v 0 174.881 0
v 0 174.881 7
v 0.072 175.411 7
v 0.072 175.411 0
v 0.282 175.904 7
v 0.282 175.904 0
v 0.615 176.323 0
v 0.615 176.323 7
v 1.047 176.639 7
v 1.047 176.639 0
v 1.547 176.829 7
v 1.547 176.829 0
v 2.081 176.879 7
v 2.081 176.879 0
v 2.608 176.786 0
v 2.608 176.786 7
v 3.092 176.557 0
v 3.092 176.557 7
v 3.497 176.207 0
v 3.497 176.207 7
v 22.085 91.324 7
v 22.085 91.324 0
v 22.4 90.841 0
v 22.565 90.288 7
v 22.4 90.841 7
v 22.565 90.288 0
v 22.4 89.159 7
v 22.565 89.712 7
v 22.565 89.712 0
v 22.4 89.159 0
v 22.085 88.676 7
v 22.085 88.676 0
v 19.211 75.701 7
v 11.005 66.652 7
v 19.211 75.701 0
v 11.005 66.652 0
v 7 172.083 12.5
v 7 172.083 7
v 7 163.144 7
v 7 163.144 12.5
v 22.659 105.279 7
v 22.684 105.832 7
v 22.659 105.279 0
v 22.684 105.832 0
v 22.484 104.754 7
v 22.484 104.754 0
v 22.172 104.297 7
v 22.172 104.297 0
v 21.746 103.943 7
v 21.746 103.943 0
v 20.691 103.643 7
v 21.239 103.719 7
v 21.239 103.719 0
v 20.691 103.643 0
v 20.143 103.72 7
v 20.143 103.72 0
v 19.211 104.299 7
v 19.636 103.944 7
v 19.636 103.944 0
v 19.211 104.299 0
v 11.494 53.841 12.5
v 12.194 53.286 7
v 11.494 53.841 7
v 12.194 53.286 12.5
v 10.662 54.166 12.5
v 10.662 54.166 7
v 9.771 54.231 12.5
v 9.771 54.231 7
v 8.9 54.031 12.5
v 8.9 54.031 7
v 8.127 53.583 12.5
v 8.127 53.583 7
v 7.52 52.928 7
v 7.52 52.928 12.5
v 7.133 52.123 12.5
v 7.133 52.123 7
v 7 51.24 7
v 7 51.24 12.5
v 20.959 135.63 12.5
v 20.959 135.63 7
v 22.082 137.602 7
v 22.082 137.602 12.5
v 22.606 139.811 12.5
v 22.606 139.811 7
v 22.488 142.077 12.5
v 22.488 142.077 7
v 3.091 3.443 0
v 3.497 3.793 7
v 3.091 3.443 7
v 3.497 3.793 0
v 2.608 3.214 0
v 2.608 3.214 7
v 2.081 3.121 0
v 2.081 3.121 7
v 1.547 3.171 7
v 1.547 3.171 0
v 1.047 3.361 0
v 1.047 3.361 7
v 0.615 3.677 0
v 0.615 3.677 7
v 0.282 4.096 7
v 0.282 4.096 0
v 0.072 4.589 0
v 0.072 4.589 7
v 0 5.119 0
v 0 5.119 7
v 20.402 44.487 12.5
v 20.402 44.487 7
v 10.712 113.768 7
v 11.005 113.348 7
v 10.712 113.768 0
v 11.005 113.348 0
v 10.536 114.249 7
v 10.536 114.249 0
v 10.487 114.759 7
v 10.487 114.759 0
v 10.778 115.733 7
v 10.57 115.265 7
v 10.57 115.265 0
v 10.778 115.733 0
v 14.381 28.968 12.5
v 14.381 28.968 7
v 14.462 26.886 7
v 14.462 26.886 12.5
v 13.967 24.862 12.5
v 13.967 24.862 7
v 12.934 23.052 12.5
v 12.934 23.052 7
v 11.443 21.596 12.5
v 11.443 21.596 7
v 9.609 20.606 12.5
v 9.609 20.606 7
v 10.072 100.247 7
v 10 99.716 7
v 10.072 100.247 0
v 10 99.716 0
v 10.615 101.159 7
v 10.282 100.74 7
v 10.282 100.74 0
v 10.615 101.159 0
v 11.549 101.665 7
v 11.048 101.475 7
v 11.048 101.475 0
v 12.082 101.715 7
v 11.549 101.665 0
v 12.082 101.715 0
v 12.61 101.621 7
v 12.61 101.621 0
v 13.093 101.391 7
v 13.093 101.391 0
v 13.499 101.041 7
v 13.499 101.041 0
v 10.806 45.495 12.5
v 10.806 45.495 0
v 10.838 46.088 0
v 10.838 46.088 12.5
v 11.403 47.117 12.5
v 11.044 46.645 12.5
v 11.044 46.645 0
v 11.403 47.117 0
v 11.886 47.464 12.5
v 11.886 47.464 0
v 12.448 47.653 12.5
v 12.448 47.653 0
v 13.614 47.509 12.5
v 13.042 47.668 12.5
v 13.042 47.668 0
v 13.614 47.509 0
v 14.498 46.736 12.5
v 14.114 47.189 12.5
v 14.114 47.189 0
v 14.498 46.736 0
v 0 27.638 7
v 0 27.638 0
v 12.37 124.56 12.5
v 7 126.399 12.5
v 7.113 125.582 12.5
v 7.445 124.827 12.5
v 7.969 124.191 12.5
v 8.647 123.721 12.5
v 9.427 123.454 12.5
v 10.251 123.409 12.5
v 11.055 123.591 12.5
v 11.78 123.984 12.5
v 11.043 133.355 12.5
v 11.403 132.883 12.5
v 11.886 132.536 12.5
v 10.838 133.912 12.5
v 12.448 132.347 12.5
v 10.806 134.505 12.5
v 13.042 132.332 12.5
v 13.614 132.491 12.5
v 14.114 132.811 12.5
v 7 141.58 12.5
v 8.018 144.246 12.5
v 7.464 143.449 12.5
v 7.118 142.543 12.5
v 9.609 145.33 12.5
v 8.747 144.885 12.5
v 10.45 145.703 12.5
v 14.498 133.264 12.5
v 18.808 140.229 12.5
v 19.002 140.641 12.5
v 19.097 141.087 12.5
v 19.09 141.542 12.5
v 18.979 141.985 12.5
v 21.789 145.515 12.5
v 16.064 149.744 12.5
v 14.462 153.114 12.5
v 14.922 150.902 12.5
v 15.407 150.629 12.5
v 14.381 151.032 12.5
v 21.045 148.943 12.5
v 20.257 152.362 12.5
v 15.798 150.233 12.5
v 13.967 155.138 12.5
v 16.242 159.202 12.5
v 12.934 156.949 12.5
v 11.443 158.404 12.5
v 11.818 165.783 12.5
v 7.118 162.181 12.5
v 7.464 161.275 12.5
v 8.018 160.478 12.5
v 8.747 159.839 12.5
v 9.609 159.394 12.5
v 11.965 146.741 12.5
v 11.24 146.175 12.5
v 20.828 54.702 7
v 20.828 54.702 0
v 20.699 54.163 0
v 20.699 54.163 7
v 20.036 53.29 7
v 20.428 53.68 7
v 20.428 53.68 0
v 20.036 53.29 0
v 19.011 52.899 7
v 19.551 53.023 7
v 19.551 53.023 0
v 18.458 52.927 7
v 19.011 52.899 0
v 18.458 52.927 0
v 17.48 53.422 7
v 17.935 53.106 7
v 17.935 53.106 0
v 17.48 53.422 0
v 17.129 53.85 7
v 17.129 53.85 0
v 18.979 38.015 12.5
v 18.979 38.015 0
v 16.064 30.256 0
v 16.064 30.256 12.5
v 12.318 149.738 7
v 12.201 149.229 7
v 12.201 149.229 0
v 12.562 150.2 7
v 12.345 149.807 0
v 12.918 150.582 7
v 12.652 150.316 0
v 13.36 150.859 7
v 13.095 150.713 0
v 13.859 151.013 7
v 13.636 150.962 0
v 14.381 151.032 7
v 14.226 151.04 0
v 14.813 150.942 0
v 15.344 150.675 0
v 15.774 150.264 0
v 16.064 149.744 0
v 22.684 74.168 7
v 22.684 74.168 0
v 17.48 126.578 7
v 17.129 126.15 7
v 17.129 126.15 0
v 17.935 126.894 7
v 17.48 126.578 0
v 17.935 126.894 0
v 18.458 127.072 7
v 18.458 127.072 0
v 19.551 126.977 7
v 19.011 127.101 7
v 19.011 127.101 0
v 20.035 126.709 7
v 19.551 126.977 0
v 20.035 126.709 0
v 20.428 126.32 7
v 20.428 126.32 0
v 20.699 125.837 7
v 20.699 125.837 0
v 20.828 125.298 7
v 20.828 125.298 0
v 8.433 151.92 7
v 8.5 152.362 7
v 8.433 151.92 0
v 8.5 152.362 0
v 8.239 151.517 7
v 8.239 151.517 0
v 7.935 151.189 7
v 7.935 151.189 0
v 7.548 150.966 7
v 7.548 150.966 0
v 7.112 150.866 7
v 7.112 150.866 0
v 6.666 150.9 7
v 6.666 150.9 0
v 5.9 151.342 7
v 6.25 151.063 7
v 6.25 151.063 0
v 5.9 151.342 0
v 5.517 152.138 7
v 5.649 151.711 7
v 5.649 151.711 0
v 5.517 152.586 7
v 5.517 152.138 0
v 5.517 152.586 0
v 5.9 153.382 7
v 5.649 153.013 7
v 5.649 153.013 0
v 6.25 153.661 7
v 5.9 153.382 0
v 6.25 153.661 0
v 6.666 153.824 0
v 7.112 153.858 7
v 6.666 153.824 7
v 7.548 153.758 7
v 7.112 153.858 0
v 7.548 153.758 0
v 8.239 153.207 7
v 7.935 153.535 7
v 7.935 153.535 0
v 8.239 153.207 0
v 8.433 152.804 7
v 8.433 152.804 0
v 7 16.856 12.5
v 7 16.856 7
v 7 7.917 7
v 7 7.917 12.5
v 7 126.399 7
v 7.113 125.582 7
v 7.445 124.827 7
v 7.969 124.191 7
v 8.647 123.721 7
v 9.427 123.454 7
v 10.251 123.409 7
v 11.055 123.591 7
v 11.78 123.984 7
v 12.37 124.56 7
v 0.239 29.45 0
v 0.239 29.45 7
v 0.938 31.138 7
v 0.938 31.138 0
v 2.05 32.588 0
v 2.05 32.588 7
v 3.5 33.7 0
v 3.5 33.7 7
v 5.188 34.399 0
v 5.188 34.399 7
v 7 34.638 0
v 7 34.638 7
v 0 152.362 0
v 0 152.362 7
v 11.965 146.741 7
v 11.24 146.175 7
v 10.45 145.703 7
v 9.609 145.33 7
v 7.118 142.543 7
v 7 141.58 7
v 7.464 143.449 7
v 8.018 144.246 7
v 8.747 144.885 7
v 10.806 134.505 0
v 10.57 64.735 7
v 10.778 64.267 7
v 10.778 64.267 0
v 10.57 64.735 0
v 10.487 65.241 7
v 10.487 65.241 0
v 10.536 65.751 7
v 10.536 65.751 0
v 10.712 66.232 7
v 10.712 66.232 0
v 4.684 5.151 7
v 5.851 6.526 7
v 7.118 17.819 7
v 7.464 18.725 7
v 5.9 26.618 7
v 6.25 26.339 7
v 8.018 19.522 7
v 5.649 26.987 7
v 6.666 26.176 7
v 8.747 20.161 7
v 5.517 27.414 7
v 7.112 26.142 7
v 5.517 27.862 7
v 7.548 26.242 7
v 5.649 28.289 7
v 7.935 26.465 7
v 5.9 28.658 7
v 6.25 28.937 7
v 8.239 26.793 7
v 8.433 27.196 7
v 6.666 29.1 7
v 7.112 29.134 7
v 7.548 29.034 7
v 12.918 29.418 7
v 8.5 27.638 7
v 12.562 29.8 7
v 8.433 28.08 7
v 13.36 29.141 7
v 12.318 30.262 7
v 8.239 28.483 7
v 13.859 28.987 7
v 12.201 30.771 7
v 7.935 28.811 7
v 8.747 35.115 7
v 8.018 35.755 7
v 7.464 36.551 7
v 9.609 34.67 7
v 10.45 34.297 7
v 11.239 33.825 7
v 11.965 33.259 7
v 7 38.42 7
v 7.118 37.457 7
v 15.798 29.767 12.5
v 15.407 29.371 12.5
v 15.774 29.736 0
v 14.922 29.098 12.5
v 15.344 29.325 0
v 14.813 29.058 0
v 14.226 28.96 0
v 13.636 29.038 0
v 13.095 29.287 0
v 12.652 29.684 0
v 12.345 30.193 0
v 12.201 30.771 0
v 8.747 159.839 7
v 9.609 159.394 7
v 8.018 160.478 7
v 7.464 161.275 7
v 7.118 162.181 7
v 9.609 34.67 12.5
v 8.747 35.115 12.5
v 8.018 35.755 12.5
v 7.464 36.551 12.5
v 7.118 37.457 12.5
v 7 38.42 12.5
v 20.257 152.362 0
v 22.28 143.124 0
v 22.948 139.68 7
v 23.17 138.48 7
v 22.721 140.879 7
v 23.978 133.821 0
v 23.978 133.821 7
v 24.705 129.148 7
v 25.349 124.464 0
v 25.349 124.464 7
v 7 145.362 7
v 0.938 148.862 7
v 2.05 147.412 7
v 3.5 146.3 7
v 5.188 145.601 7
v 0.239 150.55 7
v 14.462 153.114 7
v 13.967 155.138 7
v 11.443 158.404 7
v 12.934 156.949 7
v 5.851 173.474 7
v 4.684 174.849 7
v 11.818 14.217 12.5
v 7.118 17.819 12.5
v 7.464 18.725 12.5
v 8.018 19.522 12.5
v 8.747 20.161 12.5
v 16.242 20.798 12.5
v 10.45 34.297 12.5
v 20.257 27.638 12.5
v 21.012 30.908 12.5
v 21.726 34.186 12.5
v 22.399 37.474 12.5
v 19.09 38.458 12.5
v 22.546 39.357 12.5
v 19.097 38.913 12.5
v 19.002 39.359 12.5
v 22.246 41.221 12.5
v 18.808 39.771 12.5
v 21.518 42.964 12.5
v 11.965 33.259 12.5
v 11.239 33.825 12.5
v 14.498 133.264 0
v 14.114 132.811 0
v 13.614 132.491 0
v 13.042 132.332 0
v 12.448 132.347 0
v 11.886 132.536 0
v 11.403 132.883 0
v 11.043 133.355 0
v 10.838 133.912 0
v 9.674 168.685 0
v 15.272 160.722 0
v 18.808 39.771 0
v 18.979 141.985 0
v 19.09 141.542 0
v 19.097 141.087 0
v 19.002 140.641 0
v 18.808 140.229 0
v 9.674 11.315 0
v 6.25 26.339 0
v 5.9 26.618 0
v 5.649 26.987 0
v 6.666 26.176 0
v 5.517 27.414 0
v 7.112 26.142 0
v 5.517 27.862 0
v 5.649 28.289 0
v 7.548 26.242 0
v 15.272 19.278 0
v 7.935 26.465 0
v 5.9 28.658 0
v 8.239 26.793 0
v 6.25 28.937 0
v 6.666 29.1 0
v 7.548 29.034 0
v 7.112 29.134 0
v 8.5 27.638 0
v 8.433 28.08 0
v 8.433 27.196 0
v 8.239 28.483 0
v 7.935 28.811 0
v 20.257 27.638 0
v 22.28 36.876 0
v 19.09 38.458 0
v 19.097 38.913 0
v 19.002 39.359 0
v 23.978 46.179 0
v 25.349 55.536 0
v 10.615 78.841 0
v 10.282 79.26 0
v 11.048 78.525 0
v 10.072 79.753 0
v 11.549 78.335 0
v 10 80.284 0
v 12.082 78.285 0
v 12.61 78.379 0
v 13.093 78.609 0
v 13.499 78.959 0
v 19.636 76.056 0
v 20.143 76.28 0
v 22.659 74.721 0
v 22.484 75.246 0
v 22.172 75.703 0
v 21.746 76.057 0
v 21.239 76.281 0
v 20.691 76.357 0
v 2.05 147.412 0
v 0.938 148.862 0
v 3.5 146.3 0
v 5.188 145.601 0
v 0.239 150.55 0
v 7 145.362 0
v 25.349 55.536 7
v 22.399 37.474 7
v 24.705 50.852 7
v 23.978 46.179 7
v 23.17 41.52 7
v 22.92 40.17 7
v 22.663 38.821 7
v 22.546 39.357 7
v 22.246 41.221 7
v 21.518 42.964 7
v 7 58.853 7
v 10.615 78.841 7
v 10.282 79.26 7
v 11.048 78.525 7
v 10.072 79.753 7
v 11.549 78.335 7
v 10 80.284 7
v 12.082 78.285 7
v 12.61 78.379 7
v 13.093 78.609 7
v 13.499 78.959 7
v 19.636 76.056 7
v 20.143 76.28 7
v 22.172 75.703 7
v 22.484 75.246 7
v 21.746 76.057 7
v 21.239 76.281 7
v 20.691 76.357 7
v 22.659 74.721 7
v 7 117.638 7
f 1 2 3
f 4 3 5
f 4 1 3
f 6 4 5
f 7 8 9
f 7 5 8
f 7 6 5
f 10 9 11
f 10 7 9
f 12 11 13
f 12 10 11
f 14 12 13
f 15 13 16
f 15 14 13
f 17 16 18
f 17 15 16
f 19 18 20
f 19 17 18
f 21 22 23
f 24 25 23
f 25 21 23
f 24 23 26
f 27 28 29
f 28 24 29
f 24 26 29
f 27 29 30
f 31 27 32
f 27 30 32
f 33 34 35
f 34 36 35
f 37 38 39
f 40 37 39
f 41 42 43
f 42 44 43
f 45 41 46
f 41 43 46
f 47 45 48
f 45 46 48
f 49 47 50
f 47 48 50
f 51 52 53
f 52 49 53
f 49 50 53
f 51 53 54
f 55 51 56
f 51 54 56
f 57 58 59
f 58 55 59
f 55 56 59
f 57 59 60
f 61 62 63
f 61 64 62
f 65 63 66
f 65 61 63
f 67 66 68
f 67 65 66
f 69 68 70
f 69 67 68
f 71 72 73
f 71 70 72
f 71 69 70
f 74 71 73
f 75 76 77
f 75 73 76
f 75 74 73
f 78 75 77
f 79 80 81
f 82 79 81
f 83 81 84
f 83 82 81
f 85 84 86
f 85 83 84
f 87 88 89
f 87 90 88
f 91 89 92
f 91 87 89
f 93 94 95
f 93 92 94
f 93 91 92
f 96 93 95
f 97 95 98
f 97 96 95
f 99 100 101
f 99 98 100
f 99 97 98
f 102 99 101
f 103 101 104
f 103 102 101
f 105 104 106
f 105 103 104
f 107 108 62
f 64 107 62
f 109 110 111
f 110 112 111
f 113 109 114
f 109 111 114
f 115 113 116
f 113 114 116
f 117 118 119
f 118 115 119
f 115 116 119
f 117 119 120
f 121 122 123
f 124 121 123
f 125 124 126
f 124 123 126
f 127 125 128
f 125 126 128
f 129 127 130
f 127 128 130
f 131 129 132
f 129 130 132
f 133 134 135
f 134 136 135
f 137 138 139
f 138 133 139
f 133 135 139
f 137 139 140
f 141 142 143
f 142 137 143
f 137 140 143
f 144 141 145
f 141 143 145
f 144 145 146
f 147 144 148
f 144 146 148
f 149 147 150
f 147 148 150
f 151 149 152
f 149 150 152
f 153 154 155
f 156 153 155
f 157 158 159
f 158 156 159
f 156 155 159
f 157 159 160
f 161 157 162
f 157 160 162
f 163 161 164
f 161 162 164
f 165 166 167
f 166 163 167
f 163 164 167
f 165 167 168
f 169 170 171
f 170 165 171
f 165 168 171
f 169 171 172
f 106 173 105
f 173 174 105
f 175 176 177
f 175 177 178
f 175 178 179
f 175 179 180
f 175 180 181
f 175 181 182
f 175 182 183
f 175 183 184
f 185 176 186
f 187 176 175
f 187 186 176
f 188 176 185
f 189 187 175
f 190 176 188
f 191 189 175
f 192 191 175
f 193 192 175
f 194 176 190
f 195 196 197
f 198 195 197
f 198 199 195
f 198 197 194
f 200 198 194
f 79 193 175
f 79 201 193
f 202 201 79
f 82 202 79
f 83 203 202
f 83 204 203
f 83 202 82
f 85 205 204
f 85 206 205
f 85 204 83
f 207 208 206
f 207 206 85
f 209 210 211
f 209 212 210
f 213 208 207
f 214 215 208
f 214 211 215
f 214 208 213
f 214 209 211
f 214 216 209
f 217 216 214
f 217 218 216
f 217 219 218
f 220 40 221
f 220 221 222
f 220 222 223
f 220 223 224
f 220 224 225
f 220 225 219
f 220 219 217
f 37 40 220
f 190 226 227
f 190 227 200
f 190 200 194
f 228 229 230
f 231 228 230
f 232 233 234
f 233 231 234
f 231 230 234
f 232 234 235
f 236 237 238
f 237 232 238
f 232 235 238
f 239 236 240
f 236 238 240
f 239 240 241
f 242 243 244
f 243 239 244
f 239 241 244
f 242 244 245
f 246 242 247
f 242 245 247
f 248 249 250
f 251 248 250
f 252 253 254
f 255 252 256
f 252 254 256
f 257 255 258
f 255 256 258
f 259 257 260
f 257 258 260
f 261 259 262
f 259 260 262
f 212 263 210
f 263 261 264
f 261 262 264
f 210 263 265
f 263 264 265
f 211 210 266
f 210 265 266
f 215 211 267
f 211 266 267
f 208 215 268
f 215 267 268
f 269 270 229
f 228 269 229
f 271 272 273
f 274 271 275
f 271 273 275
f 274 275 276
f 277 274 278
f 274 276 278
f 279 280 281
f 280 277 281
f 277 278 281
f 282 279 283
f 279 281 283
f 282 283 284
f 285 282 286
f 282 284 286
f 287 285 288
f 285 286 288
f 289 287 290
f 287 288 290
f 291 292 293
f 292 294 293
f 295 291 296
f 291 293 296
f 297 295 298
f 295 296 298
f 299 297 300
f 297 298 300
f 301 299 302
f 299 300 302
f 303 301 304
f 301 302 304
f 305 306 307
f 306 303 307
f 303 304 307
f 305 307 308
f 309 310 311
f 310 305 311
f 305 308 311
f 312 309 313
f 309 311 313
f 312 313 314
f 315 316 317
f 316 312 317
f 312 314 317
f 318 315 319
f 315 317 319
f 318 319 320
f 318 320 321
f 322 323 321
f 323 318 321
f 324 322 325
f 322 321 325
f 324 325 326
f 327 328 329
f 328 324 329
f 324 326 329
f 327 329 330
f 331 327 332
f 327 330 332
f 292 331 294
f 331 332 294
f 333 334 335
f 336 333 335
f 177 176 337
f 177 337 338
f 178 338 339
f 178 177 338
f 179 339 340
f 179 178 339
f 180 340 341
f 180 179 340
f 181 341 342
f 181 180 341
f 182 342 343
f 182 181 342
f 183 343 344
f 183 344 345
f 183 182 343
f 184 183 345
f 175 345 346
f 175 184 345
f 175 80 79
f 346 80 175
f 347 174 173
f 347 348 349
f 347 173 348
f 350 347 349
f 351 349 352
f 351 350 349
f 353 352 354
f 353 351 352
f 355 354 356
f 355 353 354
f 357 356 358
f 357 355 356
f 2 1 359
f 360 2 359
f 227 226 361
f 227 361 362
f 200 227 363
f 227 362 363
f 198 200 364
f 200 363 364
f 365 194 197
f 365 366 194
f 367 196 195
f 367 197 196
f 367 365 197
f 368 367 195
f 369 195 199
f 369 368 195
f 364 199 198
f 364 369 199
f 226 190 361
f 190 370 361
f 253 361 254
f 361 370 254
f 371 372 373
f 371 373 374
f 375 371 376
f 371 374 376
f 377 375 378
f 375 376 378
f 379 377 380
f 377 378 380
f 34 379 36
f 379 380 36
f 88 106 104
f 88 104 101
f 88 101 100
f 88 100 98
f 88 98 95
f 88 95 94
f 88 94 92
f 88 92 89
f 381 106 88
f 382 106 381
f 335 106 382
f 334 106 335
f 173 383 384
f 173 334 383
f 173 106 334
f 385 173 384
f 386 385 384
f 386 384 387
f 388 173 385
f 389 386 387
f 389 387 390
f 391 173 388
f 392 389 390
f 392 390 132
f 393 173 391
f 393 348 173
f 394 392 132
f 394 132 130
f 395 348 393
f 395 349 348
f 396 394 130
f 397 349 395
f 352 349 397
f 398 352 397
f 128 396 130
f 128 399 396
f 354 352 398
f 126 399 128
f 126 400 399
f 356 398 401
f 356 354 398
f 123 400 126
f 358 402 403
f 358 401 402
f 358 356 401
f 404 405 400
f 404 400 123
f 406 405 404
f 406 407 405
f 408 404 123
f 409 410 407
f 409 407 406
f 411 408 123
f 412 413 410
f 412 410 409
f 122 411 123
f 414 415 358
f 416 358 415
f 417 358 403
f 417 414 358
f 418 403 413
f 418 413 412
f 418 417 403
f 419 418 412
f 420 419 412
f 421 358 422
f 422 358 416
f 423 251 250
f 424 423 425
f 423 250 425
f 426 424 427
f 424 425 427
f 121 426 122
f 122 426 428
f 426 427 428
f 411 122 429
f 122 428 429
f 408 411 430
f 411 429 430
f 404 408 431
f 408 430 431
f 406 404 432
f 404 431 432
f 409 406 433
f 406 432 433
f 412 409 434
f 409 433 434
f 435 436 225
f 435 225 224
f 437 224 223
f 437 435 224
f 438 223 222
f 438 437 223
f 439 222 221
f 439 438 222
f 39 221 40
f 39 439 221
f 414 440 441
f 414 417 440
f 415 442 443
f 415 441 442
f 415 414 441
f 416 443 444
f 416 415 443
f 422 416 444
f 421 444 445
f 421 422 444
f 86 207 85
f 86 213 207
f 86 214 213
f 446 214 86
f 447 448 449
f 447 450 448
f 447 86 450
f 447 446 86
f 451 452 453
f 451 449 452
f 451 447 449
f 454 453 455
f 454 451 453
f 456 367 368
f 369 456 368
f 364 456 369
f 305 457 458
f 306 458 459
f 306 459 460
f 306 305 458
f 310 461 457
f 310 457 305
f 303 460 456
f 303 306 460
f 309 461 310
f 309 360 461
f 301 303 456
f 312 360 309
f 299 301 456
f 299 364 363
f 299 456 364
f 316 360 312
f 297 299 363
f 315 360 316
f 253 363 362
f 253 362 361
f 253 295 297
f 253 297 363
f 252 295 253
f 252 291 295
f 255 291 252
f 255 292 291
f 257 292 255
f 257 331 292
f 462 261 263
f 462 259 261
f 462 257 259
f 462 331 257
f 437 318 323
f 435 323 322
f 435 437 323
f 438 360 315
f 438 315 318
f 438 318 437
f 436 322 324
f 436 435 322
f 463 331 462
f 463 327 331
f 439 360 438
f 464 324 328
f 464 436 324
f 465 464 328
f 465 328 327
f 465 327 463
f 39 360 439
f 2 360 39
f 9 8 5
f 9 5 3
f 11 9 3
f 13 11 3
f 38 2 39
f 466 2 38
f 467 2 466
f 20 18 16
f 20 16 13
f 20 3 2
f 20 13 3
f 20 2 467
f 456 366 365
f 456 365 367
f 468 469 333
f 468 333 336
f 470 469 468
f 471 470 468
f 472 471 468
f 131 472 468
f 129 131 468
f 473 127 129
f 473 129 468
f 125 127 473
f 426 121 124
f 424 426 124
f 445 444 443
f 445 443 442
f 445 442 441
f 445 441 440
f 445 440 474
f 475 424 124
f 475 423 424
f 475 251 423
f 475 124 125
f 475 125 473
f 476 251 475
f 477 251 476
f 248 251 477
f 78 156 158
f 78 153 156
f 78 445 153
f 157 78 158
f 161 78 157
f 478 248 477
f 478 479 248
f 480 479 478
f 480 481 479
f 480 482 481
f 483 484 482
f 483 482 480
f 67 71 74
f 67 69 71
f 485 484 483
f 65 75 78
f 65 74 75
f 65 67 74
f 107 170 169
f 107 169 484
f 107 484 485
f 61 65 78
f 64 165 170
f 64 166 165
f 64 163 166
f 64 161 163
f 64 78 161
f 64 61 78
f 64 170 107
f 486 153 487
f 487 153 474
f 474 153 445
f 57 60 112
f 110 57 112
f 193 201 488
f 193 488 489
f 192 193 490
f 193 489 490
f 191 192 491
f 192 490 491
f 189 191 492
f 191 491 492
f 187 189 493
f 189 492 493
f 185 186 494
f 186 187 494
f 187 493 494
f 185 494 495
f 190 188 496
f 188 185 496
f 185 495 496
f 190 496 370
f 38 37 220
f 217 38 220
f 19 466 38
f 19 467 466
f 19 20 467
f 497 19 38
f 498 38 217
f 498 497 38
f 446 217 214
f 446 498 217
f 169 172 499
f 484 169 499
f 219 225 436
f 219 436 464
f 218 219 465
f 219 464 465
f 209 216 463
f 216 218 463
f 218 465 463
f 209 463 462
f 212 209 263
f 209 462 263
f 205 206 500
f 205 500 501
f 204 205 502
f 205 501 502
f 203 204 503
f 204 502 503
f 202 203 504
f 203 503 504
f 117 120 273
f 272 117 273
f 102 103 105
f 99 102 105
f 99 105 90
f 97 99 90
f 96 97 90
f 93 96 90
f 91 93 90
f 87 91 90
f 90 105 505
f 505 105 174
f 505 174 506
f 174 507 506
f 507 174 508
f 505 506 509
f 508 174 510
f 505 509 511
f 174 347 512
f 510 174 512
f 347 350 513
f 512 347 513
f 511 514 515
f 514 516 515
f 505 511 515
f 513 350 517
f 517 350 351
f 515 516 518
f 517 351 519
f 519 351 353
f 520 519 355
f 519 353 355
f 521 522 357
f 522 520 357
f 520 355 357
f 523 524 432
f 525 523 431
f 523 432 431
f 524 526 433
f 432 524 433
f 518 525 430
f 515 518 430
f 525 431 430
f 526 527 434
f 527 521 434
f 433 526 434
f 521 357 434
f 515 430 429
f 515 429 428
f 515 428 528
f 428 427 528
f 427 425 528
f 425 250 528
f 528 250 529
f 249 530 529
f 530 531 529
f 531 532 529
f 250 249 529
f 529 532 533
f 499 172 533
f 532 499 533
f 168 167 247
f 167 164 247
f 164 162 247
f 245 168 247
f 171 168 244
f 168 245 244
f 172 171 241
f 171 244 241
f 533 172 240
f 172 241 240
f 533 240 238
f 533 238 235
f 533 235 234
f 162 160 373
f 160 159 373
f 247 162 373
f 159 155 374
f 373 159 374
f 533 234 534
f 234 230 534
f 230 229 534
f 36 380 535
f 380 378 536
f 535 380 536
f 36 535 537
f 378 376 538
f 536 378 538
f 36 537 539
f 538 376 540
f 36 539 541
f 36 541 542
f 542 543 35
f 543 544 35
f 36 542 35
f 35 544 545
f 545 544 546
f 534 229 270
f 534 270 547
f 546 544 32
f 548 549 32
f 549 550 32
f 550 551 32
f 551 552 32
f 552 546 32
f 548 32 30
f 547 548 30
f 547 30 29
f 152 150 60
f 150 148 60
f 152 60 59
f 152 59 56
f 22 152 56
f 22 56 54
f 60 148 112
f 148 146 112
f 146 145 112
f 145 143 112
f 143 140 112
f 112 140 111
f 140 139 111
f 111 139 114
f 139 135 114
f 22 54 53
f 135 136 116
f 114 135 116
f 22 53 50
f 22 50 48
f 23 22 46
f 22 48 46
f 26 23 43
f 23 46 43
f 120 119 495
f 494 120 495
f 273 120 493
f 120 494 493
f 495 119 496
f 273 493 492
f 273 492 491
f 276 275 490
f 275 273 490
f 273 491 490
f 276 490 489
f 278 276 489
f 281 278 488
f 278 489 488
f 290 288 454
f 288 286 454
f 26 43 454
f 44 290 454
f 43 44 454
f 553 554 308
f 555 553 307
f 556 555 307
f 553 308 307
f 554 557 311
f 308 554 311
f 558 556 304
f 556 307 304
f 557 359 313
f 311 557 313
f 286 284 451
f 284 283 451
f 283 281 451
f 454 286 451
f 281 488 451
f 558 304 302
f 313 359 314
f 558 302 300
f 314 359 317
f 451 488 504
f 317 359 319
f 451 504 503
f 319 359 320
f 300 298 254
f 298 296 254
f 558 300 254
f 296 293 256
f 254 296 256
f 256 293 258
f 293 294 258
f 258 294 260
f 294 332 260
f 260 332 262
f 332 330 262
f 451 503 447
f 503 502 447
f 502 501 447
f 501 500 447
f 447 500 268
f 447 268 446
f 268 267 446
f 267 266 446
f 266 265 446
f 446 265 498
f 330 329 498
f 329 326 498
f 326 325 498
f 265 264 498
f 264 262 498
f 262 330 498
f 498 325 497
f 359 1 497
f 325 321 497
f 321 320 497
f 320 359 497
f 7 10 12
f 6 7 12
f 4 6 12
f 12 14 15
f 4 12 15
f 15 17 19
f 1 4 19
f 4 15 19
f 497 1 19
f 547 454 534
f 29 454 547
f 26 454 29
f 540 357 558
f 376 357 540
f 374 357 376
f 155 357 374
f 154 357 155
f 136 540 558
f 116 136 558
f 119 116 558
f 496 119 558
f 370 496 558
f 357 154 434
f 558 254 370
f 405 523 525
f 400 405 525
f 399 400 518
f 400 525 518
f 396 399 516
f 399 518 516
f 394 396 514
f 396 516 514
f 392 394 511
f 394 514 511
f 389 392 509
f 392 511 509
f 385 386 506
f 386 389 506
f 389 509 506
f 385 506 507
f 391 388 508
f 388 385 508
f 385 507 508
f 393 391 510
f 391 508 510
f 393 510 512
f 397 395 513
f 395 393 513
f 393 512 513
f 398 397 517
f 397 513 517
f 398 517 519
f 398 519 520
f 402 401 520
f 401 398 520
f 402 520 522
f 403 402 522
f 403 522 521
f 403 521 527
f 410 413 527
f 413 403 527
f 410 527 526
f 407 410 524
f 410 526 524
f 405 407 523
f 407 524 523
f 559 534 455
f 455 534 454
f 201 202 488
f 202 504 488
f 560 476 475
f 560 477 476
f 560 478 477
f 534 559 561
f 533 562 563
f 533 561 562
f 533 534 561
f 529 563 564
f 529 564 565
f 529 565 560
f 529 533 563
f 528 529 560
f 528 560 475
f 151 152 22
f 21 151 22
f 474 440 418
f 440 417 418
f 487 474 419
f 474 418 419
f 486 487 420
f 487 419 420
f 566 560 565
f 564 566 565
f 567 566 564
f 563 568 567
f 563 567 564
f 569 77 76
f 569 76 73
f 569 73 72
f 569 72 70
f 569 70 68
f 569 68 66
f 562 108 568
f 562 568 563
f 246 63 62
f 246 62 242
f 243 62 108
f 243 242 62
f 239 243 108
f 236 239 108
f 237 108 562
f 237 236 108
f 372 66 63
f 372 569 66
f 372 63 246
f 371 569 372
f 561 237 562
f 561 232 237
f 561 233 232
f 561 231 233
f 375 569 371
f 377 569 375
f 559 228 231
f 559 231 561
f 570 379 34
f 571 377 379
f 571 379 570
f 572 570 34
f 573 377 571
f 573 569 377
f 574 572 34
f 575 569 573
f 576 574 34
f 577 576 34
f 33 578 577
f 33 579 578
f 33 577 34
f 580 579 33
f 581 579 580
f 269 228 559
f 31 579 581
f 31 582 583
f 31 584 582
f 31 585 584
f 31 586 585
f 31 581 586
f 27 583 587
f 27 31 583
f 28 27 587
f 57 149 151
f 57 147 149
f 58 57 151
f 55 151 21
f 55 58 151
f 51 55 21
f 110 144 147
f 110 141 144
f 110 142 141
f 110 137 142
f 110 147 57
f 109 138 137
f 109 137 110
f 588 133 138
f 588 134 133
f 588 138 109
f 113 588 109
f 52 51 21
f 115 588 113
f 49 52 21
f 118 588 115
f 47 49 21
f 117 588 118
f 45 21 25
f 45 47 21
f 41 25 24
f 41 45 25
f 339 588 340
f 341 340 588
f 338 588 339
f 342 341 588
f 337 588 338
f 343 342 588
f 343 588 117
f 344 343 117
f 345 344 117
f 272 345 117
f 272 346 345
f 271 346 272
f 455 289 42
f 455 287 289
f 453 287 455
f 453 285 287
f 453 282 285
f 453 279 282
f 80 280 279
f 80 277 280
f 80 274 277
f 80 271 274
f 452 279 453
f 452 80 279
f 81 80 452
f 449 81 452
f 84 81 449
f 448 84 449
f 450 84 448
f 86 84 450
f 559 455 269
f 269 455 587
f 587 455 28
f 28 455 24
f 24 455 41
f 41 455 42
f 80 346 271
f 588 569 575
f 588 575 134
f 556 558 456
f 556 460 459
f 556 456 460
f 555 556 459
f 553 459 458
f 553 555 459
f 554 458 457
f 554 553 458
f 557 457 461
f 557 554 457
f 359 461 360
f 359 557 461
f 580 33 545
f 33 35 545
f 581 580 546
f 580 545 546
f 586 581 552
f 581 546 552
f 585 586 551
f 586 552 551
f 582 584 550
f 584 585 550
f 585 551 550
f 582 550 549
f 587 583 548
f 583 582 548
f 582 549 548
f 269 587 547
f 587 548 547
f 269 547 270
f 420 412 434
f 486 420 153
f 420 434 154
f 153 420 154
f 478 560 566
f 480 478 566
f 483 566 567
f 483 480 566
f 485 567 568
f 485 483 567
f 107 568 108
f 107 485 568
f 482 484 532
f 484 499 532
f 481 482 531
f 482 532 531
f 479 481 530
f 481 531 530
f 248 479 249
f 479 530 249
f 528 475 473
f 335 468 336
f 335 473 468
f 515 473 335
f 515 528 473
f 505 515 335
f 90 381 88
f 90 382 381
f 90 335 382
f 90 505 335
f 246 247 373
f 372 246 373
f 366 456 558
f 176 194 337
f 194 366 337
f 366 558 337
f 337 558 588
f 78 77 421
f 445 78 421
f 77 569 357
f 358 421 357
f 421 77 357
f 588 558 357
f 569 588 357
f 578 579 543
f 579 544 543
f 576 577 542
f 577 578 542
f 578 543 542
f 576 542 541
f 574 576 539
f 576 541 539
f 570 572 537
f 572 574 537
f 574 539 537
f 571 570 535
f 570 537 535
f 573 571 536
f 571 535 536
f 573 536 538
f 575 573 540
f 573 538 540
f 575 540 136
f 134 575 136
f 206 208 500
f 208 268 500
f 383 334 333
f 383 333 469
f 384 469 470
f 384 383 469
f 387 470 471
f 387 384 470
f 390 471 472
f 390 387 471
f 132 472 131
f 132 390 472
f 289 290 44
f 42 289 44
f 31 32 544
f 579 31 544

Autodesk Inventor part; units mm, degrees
ref_plane "YZ Plane" through (0, 0, 0) normal (1, 0, 0) x (0, 1, 0)
ref_plane "XZ Plane" through (0, 0, 0) normal (0, 1, 0) x (-1, 0, 0)
ref_plane "XY Plane" through (0, 0, 0) normal (0, 0, 1) x (1, 0, 0)
sketch "スケッチ1" plane through (0, 0, 0) normal (0, 0, 1) x (1, 0, 0)
  arc A0 (0, 5.1191) -> (3.497, 3.7928) centre (2, 5.1191) ccw
  arc A1 (3.497, 3.7928) -> (20.2574, 27.638) centre (-93.8083, 90) ccw
  arc A2 (20.2574, 27.638) -> (25.3494, 55.5364) centre (-242.442, 90) ccw
  line L0 (25.3494, 55.5364) -> (25.3494, 124.4636)
  arc A3 (25.3494, 124.4636) -> (20.2574, 152.362) centre (-242.442, 90) ccw
  arc A4 (20.2574, 152.362) -> (3.497, 176.2072) centre (-93.8083, 90) ccw
  arc A5 (3.497, 176.2072) -> (0, 174.8809) centre (2, 174.8809) ccw
  line L1 (0, 174.8809) -> (0, 152.362)
  arc A6 (0, 152.362) -> (7, 145.362) centre (7, 152.362) ccw
  line L2 (7, 145.362) -> (7, 109.815)
  line L3 (7, 80.815) -> (7, 34.638)
  arc A7 (7, 34.638) -> (0, 27.638) centre (7, 27.638) ccw
  line L4 (0, 27.638) -> (0, 5.1191)
  arc A8 (20.8277, 125.2984) -> (17.1291, 126.1497) centre (18.8368, 125.1086) ccw
  line L5 (20.8277, 125.2984) -> (22.6836, 105.8325)
  arc A9 (19.2111, 104.2992) -> (22.6836, 105.8325) centre (20.6926, 105.6427) ccw
  line L6 (19.2111, 104.2992) -> (11.0046, 113.3481)
  arc A10 (10.7784, 115.7327) -> (11.0046, 113.3481) centre (12.4861, 114.6917) ccw
  line L7 (10.7784, 115.7327) -> (17.1291, 126.1497)
  arc A11 (18.8075, 140.2289) -> (18.979, 141.9846) centre (17.1068, 141.2812) ccw
  line L8 (18.8075, 140.2289) -> (14.4979, 133.2642)
  arc A12 (10.8061, 134.5052) -> (14.4979, 133.2642) centre (12.7972, 134.3166) ccw
  line L9 (10.8061, 134.5052) -> (12.2009, 149.2292)
  arc A13 (16.0642, 149.7439) -> (12.2009, 149.2292) centre (14.192, 149.0405) ccw
  line L10 (16.0642, 149.7439) -> (18.979, 141.9846)
  arc A14 (14.4979, 46.7358) -> (10.8061, 45.4948) centre (12.7972, 45.6834) ccw
  line L11 (14.4979, 46.7358) -> (18.8075, 39.7711)
  arc A15 (18.979, 38.0154) -> (18.8075, 39.7711) centre (17.1068, 38.7188) ccw
  line L12 (18.979, 38.0154) -> (16.0642, 30.2561)
  arc A16 (12.2009, 30.7708) -> (16.0642, 30.2561) centre (14.192, 30.9595) ccw
  line L13 (12.2009, 30.7708) -> (10.8061, 45.4948)
  arc A17 (11.0046, 66.6519) -> (10.7784, 64.2673) centre (12.4861, 65.3083) ccw
  line L14 (11.0046, 66.6519) -> (19.2111, 75.7008)
  arc A18 (22.6836, 74.1675) -> (19.2111, 75.7008) centre (20.6926, 74.3573) ccw
  line L15 (22.6836, 74.1675) -> (20.8277, 54.7016)
  arc A19 (17.1291, 53.8503) -> (20.8277, 54.7016) centre (18.8368, 54.8914) ccw
  line L16 (17.1291, 53.8503) -> (10.7784, 64.2673)
  arc A20 (13.4987, 101.0407) -> (10, 99.7163) centre (12, 99.7163) ccw
  line L17 (13.4987, 101.0407) -> (22.0846, 91.3243)
  arc A21 (22.0846, 88.6757) -> (22.0846, 91.3243) centre (20.5859, 90) ccw
  line L18 (22.0846, 88.6757) -> (13.4987, 78.9593)
  arc A22 (10, 80.2837) -> (13.4987, 78.9593) centre (12, 80.2837) ccw
  line L19 (10, 80.2837) -> (10, 99.7163)
  circle A23 centre (7, 152.362) radius 1.5
  circle A24 centre (7, 27.638) radius 1.5
  line L20 (7, 109.815) -> (7, 80.815)
  point P0 (0, 0)
  point P1 (0, 0)
extrude "押し出し1" add sketch "スケッチ1" along normal blind 7
sketch "スケッチ2" plane through (0, 0, 7) normal (0, 0, 1) x (1, 0, 0)
  line L0 (7, 52.6381) -> (7, 57.6381)
  line L1 (7, 52.6381) -> (7, 42.6381)
  line L2 (7, 12.6381) -> (7, 8.9003)
  line L3 (7, 42.6381) -> (7, 38.42)
  line L4 (7, 12.6381) -> (7, 16.8562)
  line L5 (7, 141.5801) -> (7, 122.6381)
  line L6 (7, 171.0997) -> (7, 163.1439)
  circle A0 centre (7, 152.362) radius 1.5 projected
  arc A1 (10, 80.2837) -> (13.4987, 78.9593) centre (12, 80.2837) ccw projected
  line L7 (10, 80.2837) -> (10, 99.7163) projected
  arc A2 (13.4987, 101.0407) -> (10, 99.7163) centre (12, 99.7163) ccw projected
  line L8 (13.4987, 101.0407) -> (22.0846, 91.3243) projected
  arc A3 (22.0846, 88.6757) -> (22.0846, 91.3243) centre (20.5859, 90) ccw projected
  line L9 (22.0846, 88.6757) -> (13.4987, 78.9593) projected
  arc A4 (19.2111, 104.2992) -> (22.6836, 105.8325) centre (20.6926, 105.6427) ccw projected
  line L10 (19.2111, 104.2992) -> (11.0046, 113.3481) projected
  arc A5 (10.7784, 115.7327) -> (11.0046, 113.3481) centre (12.4861, 114.6917) ccw projected
  line L11 (10.7784, 115.7327) -> (17.1291, 126.1497) projected
  arc A6 (20.8277, 125.2984) -> (17.1291, 126.1497) centre (18.8368, 125.1086) ccw projected
  line L12 (20.8277, 125.2984) -> (22.6836, 105.8325) projected
  line L13 (11.0046, 66.6519) -> (19.2111, 75.7008) projected
  arc A7 (22.6836, 74.1675) -> (19.2111, 75.7008) centre (20.6926, 74.3573) ccw projected
  line L14 (22.6836, 74.1675) -> (20.8277, 54.7016) projected
  arc A8 (17.1291, 53.8503) -> (20.8277, 54.7016) centre (18.8368, 54.8914) ccw projected
  line L15 (17.1291, 53.8503) -> (10.7784, 64.2673) projected
  arc A9 (11.0046, 66.6519) -> (10.7784, 64.2673) centre (12.4861, 65.3083) ccw projected
  line L16 (14.4979, 46.7358) -> (18.8075, 39.7711) projected
  arc A10 (18.979, 38.0154) -> (18.8075, 39.7711) centre (17.1068, 38.7188) ccw projected
  line L17 (18.979, 38.0154) -> (16.0642, 30.2561) projected
  arc A11 (12.2009, 30.7708) -> (16.0642, 30.2561) centre (14.192, 30.9595) ccw projected
  line L18 (12.2009, 30.7708) -> (10.8061, 45.4948) projected
  arc A12 (14.4979, 46.7358) -> (10.8061, 45.4948) centre (12.7972, 45.6834) ccw projected
  arc A13 (16.0642, 149.7439) -> (12.2009, 149.2292) centre (14.192, 149.0405) ccw projected
  line L19 (16.0642, 149.7439) -> (18.979, 141.9846) projected
  arc A14 (18.8075, 140.2289) -> (18.979, 141.9846) centre (17.1068, 141.2812) ccw projected
  line L20 (18.8075, 140.2289) -> (14.4979, 133.2642) projected
  arc A15 (10.8061, 134.5052) -> (14.4979, 133.2642) centre (12.7972, 134.3166) ccw projected
  line L21 (10.8061, 134.5052) -> (12.2009, 149.2292) projected
  circle A16 centre (7, 27.638) radius 1.5 projected
  circle A17 centre (7, 152.362) radius 1.5 projected
  arc A18 (25.3494, 124.4636) -> (20.2574, 152.362) centre (-242.442, 90) ccw projected
  arc A19 (20.2574, 152.362) -> (3.497, 176.2072) centre (-93.8083, 90) ccw projected
  arc A20 (3.497, 176.2072) -> (0, 174.8809) centre (2, 174.8809) ccw projected
  line L22 (0, 174.8809) -> (0, 152.362) projected
  arc A21 (0, 152.362) -> (7, 145.362) centre (7, 152.362) ccw projected
  line L23 (7, 145.362) -> (7, 34.638) projected
  arc A22 (7, 34.638) -> (0, 27.638) centre (7, 27.638) ccw projected
  line L24 (0, 27.638) -> (0, 5.1191) projected
  arc A23 (0, 5.1191) -> (3.497, 3.7928) centre (2, 5.1191) ccw projected
  arc A24 (3.497, 3.7928) -> (20.2574, 27.638) centre (-93.8083, 90) ccw projected
  arc A25 (20.2574, 27.638) -> (25.3494, 55.5364) centre (-242.442, 90) ccw projected
  line L25 (25.3494, 55.5364) -> (25.3494, 124.4636) projected
  line L26 (7, 171.0997) -> (7, 172.0834)
  arc A26 (20.2574, 152.362) -> (3.497, 176.2072) centre (-93.8083, 90) ccw projected
  line L27 (7, 8.9003) -> (7, 7.9166)
  arc A27 (3.497, 3.7928) -> (20.2574, 27.638) centre (-93.8083, 90) ccw projected
  arc A28 (7, 163.1439) -> (9.6087, 159.3937) centre (11, 163.1439) ccw
  arc A29 (9.6087, 145.3303) -> (7, 141.5801) centre (11, 141.5801) ccw
  arc A30 (9.6087, 20.6064) -> (7, 16.8562) centre (11, 16.8562) ccw
  arc A31 (7, 38.42) -> (9.6087, 34.6698) centre (11, 38.42) ccw
  line L28 (16.0642, 149.7439) -> (18.979, 141.9846) projected
  arc A32 (10, 80.2837) -> (13.4987, 78.9593) centre (12, 80.2837) ccw projected
  line L29 (10, 80.2837) -> (10, 99.7163) projected
  arc A33 (13.4987, 101.0407) -> (10, 99.7163) centre (12, 99.7163) ccw projected
  line L30 (13.4987, 101.0407) -> (22.0846, 91.3243) projected
  arc A34 (22.0846, 88.6757) -> (22.0846, 91.3243) centre (20.5859, 90) ccw projected
  line L31 (22.0846, 88.6757) -> (13.4987, 78.9593) projected
  arc A35 (19.2111, 104.2992) -> (22.6836, 105.8325) centre (20.6926, 105.6427) ccw projected
  line L32 (19.2111, 104.2992) -> (11.0046, 113.3481) projected
  arc A36 (10.7784, 115.7327) -> (11.0046, 113.3481) centre (12.4861, 114.6917) ccw projected
  line L33 (10.7784, 115.7327) -> (17.1291, 126.1497) projected
  arc A37 (20.8277, 125.2984) -> (17.1291, 126.1497) centre (18.8368, 125.1086) ccw projected
  line L34 (20.8277, 125.2984) -> (22.6836, 105.8325) projected
  line L35 (11.0046, 66.6519) -> (19.2111, 75.7008) projected
  arc A38 (22.6836, 74.1675) -> (19.2111, 75.7008) centre (20.6926, 74.3573) ccw projected
  line L36 (22.6836, 74.1675) -> (20.8277, 54.7016) projected
  arc A39 (17.1291, 53.8503) -> (20.8277, 54.7016) centre (18.8368, 54.8914) ccw projected
  line L37 (17.1291, 53.8503) -> (10.7784, 64.2673) projected
  arc A40 (11.0046, 66.6519) -> (10.7784, 64.2673) centre (12.4861, 65.3083) ccw projected
  line L38 (14.4979, 46.7358) -> (18.8075, 39.7711) projected
  arc A41 (18.979, 38.0154) -> (18.8075, 39.7711) centre (17.1068, 38.7188) ccw projected
  line L39 (18.979, 38.0154) -> (16.0642, 30.2561) projected
  arc A42 (12.2009, 30.7708) -> (16.0642, 30.2561) centre (14.192, 30.9595) ccw projected
  line L40 (12.2009, 30.7708) -> (10.8061, 45.4948) projected
  arc A43 (14.4979, 46.7358) -> (10.8061, 45.4948) centre (12.7972, 45.6834) ccw projected
  arc A44 (16.0642, 149.7439) -> (12.2009, 149.2292) centre (14.192, 149.0405) ccw projected
  line L41 (16.0642, 149.7439) -> (18.979, 141.9846) projected
  arc A45 (18.8075, 140.2289) -> (18.979, 141.9846) centre (17.1068, 141.2812) ccw projected
  line L42 (18.8075, 140.2289) -> (14.4979, 133.2642) projected
  arc A46 (10.8061, 134.5052) -> (14.4979, 133.2642) centre (12.7972, 134.3166) ccw projected
  line L43 (10.8061, 134.5052) -> (12.2009, 149.2292) projected
  circle A47 centre (7, 27.638) radius 1.5 projected
  circle A48 centre (7, 152.362) radius 1.5 projected
  arc A49 (25.3494, 124.4636) -> (20.2574, 152.362) centre (-242.442, 90) ccw projected
  arc A50 (20.2574, 152.362) -> (3.497, 176.2072) centre (-93.8083, 90) ccw projected
  arc A51 (3.497, 176.2072) -> (0, 174.8809) centre (2, 174.8809) ccw projected
  line L44 (0, 174.8809) -> (0, 152.362) projected
  arc A52 (0, 152.362) -> (7, 145.362) centre (7, 152.362) ccw projected
  line L45 (7, 145.362) -> (7, 34.638) projected
  arc A53 (7, 34.638) -> (0, 27.638) centre (7, 27.638) ccw projected
  line L46 (0, 27.638) -> (0, 5.1191) projected
  arc A54 (0, 5.1191) -> (3.497, 3.7928) centre (2, 5.1191) ccw projected
  arc A55 (3.497, 3.7928) -> (20.2574, 27.638) centre (-93.8083, 90) ccw projected
  arc A56 (20.2574, 27.638) -> (25.3494, 55.5364) centre (-242.442, 90) ccw projected
  line L47 (25.3494, 55.5364) -> (25.3494, 124.4636) projected
  arc A57 (10.8061, 134.5052) -> (14.4979, 133.2642) centre (12.7972, 134.3166) ccw
  arc A58 (10.8061, 134.5052) -> (14.4979, 133.2642) centre (12.7972, 134.3166) ccw projected
  line L48 (10.8061, 134.5052) -> (11.9652, 146.7409)
  line L49 (14.4979, 133.2642) -> (18.8075, 140.2289)
  line L50 (18.979, 141.9846) -> (16.0642, 149.7439)
  arc A59 (18.8075, 140.2289) -> (18.979, 141.9846) centre (17.1068, 141.2812) ccw
  arc A60 (9.6087, 145.3303) -> (11.9652, 146.7409) centre (7, 152.362) ccw
  arc A61 (14.3811, 151.0316) -> (9.6087, 159.3937) centre (7, 152.362) ccw
  arc A62 (16.0642, 149.7439) -> (14.3811, 151.0316) centre (14.192, 149.0405) ccw
  arc A63 (14.3811, 28.9684) -> (16.0642, 30.2561) centre (14.192, 30.9595) ccw
  arc A64 (14.4979, 46.7358) -> (10.8061, 45.4948) centre (12.7972, 45.6834) ccw
  arc A65 (18.979, 38.0154) -> (18.8075, 39.7711) centre (17.1068, 38.7188) ccw
  line L51 (10.8061, 45.4948) -> (11.9651, 33.2592)
  arc A66 (18.979, 38.0154) -> (18.8075, 39.7711) centre (17.1068, 38.7188) ccw projected
  line L52 (16.0642, 30.2561) -> (18.979, 38.0154)
  line L53 (14.4979, 46.7358) -> (18.8075, 39.7711) projected
  line L54 (18.8075, 39.7711) -> (14.4979, 46.7358)
  arc A67 (9.6087, 20.6064) -> (14.3811, 28.9684) centre (7, 27.6381) ccw
  arc A68 (11.9651, 33.2592) -> (9.6087, 34.6698) centre (7, 27.6381) ccw
  arc A69 (25.3494, 124.4636) -> (20.2574, 152.362) centre (-242.442, 90) ccw projected
  line L55 (23.1699, 138.4797) -> (7, 117.6381)
  line L56 (23.1699, 41.5203) -> (7, 58.8532)
  line L57 (7, 34.638) -> (7, 145.362) projected
  line L58 (7, 57.6381) -> (7, 58.8532)
  line L59 (7, 117.6381) -> (7, 122.6381)
  point P0 (0, 0)
  point P1 (7, 35.1381)
  point P2 (7, 20.1381)
  point P3 (7, 144.862)
  point P4 (7, 159.862)
  dimension "d6" = 4
extrude "押し出し2" add sketch "スケッチ2" along normal blind 5.5 contours L0 L23 L56 A25 A24 L27 L2 L4 A30 A67 A11 L17 A10 L16 A12 L18 A68 A31 L3 L1 | L23 L5 A29 A60 L21 A15 L20 A14 L19 A13 A61 A28 L6 L26 A19 A18 L55
fillet "フィレット1" radius 8 2 edges at (23.1699, 138.4797, 9.75) (23.1699, 41.5203, 9.75)
fillet "フィレット1" radius 3 2 edges at (7, 117.6381, 9.75) (7, 58.8532, 9.75)
properties part number "ガイド横上"
